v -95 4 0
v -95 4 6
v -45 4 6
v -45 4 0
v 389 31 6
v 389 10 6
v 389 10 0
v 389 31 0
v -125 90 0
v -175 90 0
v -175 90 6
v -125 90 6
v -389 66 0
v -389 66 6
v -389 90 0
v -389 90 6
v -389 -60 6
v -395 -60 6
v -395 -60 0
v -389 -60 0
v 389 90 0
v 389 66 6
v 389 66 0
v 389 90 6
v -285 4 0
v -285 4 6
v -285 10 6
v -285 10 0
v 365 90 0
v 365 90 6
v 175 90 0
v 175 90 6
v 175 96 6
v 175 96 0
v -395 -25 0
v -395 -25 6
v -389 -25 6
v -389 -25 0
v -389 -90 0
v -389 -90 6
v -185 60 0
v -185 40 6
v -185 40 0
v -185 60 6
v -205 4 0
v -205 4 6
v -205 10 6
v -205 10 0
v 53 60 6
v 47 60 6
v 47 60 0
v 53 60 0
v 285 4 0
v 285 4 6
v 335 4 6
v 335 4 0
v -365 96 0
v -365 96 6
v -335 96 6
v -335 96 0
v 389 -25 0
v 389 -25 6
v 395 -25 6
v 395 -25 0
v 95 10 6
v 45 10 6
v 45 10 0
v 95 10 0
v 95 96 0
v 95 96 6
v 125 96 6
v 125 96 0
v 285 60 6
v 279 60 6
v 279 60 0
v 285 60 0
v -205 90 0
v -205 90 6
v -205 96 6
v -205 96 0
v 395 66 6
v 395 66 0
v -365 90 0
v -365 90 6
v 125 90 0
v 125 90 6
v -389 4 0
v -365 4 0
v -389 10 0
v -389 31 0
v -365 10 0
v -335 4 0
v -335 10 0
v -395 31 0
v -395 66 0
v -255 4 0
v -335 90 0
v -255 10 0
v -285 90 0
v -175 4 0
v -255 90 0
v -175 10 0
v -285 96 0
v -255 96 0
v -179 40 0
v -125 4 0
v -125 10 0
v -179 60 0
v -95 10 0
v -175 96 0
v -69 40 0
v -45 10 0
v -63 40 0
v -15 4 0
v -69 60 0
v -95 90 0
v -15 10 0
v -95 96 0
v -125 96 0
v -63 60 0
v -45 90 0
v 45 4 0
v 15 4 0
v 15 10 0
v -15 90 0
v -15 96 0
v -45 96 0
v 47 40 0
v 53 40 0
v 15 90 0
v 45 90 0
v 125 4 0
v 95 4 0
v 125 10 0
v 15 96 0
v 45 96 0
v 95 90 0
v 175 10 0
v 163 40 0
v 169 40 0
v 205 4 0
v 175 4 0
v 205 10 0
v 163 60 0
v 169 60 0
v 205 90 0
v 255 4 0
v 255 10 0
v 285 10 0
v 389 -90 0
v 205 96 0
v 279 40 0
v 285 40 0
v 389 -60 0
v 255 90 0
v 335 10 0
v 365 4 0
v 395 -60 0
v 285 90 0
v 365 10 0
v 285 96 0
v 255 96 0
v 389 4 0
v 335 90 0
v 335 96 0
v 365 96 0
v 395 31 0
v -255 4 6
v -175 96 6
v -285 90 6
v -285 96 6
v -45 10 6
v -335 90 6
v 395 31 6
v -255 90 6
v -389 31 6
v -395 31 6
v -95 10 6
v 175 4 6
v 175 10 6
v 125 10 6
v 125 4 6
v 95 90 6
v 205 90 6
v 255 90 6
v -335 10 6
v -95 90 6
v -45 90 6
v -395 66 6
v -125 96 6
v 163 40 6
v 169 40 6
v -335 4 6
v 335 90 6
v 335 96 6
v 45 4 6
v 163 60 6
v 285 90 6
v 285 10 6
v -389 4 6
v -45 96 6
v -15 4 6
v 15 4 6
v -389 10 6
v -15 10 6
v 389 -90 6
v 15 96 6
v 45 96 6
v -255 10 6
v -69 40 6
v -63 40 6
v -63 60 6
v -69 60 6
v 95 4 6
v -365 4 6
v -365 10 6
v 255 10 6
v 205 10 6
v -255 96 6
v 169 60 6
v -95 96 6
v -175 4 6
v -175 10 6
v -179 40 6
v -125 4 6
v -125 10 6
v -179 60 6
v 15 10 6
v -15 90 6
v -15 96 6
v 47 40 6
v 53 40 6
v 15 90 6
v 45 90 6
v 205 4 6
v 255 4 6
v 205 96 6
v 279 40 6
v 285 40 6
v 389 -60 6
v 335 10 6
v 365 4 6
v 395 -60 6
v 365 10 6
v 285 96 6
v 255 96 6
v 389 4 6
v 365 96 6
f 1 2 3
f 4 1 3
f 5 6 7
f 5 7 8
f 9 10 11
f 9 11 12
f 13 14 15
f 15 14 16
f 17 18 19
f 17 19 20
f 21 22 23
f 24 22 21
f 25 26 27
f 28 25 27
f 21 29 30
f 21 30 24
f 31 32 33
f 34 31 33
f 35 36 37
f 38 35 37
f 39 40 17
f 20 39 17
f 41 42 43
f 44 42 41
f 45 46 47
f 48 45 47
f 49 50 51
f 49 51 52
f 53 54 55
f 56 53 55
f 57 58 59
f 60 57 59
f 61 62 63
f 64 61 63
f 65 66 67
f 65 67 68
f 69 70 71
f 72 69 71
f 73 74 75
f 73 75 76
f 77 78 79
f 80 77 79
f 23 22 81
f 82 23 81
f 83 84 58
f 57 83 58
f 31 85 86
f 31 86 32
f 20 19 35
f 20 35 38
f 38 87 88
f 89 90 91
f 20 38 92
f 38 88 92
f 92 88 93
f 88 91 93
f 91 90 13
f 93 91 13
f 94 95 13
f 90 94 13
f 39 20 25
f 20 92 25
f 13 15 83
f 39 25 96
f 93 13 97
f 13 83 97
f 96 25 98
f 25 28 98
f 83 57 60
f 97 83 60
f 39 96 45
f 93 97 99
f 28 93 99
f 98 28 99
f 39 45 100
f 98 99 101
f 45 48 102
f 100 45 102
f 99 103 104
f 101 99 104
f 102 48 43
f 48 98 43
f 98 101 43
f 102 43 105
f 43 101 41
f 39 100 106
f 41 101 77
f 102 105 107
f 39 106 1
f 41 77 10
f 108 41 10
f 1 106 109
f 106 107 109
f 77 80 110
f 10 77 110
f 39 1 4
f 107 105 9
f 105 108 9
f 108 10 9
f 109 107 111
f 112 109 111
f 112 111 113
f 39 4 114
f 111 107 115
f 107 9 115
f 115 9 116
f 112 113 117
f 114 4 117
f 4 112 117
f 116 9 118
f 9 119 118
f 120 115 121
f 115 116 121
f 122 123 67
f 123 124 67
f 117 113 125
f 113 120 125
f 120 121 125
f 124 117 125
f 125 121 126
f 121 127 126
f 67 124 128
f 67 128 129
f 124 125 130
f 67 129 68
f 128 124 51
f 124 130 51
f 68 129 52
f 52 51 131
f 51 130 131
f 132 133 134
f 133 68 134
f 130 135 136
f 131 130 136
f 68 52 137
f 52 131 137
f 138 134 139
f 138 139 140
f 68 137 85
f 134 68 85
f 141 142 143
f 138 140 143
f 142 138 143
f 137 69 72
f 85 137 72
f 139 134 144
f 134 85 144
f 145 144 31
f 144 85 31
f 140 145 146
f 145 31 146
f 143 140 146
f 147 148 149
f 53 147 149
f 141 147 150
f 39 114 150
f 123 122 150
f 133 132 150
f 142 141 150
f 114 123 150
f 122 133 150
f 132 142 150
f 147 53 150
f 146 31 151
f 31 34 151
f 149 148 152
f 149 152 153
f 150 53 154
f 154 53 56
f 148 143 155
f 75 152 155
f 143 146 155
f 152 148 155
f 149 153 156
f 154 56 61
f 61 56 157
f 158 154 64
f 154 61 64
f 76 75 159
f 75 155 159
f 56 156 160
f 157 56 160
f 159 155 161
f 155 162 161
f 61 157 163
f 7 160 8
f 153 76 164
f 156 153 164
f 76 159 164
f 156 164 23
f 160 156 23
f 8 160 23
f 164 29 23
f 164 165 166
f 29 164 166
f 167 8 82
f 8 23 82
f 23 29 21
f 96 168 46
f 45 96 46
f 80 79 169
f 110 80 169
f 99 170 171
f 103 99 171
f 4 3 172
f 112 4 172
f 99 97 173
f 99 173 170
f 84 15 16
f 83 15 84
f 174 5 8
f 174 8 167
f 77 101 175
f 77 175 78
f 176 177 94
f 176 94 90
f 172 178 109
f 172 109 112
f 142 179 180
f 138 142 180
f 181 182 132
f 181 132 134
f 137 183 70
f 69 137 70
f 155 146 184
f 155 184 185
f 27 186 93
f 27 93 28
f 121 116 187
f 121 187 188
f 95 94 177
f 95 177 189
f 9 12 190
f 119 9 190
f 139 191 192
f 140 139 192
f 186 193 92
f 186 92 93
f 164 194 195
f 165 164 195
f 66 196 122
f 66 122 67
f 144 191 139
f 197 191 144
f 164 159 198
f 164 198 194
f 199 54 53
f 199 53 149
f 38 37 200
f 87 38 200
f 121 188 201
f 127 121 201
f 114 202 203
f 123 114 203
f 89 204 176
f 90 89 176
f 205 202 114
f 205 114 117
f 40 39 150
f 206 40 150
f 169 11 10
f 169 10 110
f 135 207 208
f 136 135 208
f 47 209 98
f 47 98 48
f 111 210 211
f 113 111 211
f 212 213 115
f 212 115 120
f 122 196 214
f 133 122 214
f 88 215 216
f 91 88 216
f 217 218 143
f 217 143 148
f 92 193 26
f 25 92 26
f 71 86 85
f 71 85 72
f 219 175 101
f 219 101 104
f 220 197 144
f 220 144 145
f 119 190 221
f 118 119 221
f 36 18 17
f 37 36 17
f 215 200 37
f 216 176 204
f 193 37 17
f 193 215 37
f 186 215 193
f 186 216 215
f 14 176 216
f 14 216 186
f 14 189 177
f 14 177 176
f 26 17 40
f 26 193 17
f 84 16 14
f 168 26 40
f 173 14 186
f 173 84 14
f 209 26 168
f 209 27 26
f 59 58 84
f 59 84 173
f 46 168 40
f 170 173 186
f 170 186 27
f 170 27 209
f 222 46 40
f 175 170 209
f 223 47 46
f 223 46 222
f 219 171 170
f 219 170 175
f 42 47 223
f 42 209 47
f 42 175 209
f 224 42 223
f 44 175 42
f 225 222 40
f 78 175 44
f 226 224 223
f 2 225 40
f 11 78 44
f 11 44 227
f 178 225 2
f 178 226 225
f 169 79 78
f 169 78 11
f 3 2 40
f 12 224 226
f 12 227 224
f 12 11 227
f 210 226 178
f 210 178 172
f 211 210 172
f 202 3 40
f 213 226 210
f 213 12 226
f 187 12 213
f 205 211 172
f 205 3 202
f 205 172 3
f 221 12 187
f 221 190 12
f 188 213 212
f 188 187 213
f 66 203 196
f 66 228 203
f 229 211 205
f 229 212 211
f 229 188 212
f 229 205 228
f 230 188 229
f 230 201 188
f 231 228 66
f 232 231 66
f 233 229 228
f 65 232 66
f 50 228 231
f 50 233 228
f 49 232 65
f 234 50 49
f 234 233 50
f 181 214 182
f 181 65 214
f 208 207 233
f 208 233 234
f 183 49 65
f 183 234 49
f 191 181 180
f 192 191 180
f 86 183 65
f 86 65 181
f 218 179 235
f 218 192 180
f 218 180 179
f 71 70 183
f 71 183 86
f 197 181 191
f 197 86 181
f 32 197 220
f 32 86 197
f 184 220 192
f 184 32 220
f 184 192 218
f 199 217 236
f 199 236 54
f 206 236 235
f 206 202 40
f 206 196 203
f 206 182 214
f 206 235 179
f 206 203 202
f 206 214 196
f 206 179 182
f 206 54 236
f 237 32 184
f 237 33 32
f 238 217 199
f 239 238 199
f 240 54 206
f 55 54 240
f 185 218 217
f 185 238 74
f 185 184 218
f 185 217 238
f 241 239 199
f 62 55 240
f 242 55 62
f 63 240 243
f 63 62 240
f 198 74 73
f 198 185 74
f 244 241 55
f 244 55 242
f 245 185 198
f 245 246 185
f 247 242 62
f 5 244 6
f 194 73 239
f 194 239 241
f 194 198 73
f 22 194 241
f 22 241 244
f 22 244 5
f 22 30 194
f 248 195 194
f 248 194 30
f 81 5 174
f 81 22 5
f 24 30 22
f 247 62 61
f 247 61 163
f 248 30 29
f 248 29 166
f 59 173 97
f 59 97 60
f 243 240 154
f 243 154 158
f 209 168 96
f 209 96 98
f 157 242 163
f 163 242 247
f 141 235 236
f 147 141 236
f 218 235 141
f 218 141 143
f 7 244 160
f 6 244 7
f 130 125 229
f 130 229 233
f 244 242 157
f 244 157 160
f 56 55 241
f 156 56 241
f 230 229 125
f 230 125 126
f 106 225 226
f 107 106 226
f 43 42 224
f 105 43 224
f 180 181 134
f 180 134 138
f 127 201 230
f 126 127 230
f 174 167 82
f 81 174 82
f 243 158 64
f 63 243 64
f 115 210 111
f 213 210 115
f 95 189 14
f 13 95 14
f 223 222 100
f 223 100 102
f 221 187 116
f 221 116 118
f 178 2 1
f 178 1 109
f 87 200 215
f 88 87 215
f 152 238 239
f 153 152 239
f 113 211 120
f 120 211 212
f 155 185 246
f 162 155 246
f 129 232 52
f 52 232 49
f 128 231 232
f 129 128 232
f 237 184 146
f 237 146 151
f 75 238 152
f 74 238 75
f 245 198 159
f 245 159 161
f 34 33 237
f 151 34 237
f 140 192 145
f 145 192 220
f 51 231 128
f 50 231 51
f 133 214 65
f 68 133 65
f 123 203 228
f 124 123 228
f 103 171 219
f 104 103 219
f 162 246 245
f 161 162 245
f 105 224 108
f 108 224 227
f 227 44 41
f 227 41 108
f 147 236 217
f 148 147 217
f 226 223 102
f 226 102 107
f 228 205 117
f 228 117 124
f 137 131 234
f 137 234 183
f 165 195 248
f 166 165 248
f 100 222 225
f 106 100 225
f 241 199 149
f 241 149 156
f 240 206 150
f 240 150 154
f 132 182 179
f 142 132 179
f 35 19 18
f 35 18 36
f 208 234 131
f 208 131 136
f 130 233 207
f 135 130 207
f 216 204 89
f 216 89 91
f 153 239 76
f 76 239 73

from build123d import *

# Parameters (mm, degrees)
SKETCH1_W           = 790
SKETCH1_H           = 180
BOSS_EXTRUDE1_DEPTH = 6
SKETCH2_W           = 50
SKETCH2_H           = 6
SKETCH2_W_2         = 30
CUT_EXTRUDE1_DEPTH  = 10
SKETCH3_W           = 6
SKETCH3_H           = 20
CUT_EXTRUDE2_DEPTH  = 10
SKETCH4_W           = 30
SKETCH4_H           = 6
BOSS_EXTRUDE2_DEPTH = 6
SKETCH5_W           = 6
SKETCH5_H           = 30
SKETCH5_H_2         = 29
SKETCH5_H_3         = 24
SKETCH5_H_4         = 21
CUT_EXTRUDE3_DEPTH  = 6


with BuildPart() as part:
    # Sketch1 → Boss-Extrude1 (new body)
    with BuildSketch(Plane.XY):
        Rectangle(SKETCH1_W, SKETCH1_H)
    extrude(amount=BOSS_EXTRUDE1_DEPTH)

    # Sketch2 → Cut-Extrude1 (cut)
    with BuildSketch(Plane.XY.offset(6)):
        with Locations((150, 7)):
            Rectangle(SKETCH2_W, SKETCH2_H)
        with Locations((0, 7)):
            Rectangle(SKETCH2_W_2, SKETCH2_H)
        with Locations((70, 7)):
            Rectangle(SKETCH2_W, SKETCH2_H)
        with Locations((230, 7)):
            Rectangle(SKETCH2_W, SKETCH2_H)
        with Locations((310, 7)):
            Rectangle(SKETCH2_W, SKETCH2_H)
        with Locations((390, 7)):
            Rectangle(SKETCH2_W, SKETCH2_H)
        with Locations((-390, 7)):
            Rectangle(SKETCH2_W, SKETCH2_H)
        with Locations((-310, 7)):
            Rectangle(SKETCH2_W, SKETCH2_H)
        with Locations((-230, 7)):
            Rectangle(SKETCH2_W, SKETCH2_H)
        with Locations((-150, 7)):
            Rectangle(SKETCH2_W, SKETCH2_H)
        with Locations((-70, 7)):
            Rectangle(SKETCH2_W, SKETCH2_H)
    extrude(amount=-CUT_EXTRUDE1_DEPTH, mode=Mode.SUBTRACT)

    # Sketch3 → Cut-Extrude2 (cut)
    with BuildSketch(Plane.XY.offset(6)):
        with Locations((-66, 50)):
            Rectangle(SKETCH3_W, SKETCH3_H)
        with Locations((-182, 50)):
            Rectangle(SKETCH3_W, SKETCH3_H)
        with Locations((50, 50)):
            Rectangle(SKETCH3_W, SKETCH3_H)
        with Locations((166, 50)):
            Rectangle(SKETCH3_W, SKETCH3_H)
        with Locations((282, 50)):
            Rectangle(SKETCH3_W, SKETCH3_H)
    extrude(amount=-CUT_EXTRUDE2_DEPTH, mode=Mode.SUBTRACT)

    # Sketch4 → Boss-Extrude2 (add)
    with BuildSketch(Plane.XY.offset(6)):
        with Locations((110, 93)):
            Rectangle(SKETCH4_W, SKETCH4_H)
        with Locations((30, 93)):
            Rectangle(SKETCH4_W, SKETCH4_H)
        with Locations((190, 93)):
            Rectangle(SKETCH4_W, SKETCH4_H)
        with Locations((270, 93)):
            Rectangle(SKETCH4_W, SKETCH4_H)
        with Locations((350, 93)):
            Rectangle(SKETCH4_W, SKETCH4_H)
        with Locations((-350, 93)):
            Rectangle(SKETCH4_W, SKETCH4_H)
        with Locations((-270, 93)):
            Rectangle(SKETCH4_W, SKETCH4_H)
        with Locations((-190, 93)):
            Rectangle(SKETCH4_W, SKETCH4_H)
        with Locations((-30, 93)):
            Rectangle(SKETCH4_W, SKETCH4_H)
        with Locations((-110, 93)):
            Rectangle(SKETCH4_W, SKETCH4_H)
    extrude(amount=-BOSS_EXTRUDE2_DEPTH)

    # Sketch5 → Cut-Extrude3 (cut)
    with BuildSketch(Plane.XY.offset(6)):
        with Locations((392, -75)):
            Rectangle(SKETCH5_W, SKETCH5_H)
        with Locations((392, -10.5)):
            Rectangle(SKETCH5_W, SKETCH5_H_2)
        with Locations((392, 78)):
            Rectangle(SKETCH5_W, SKETCH5_H_3)
        with Locations((392, 20.5)):
            Rectangle(SKETCH5_W, SKETCH5_H_4)
        with Locations((-392, 20.5)):
            Rectangle(SKETCH5_W, SKETCH5_H_4)
        with Locations((-392, 78)):
            Rectangle(SKETCH5_W, SKETCH5_H_3)
        with Locations((-392, -10.5)):
            Rectangle(SKETCH5_W, SKETCH5_H_2)
        with Locations((-392, -75)):
            Rectangle(SKETCH5_W, SKETCH5_H)
    extrude(amount=-CUT_EXTRUDE3_DEPTH, mode=Mode.SUBTRACT)


solid = part.part
